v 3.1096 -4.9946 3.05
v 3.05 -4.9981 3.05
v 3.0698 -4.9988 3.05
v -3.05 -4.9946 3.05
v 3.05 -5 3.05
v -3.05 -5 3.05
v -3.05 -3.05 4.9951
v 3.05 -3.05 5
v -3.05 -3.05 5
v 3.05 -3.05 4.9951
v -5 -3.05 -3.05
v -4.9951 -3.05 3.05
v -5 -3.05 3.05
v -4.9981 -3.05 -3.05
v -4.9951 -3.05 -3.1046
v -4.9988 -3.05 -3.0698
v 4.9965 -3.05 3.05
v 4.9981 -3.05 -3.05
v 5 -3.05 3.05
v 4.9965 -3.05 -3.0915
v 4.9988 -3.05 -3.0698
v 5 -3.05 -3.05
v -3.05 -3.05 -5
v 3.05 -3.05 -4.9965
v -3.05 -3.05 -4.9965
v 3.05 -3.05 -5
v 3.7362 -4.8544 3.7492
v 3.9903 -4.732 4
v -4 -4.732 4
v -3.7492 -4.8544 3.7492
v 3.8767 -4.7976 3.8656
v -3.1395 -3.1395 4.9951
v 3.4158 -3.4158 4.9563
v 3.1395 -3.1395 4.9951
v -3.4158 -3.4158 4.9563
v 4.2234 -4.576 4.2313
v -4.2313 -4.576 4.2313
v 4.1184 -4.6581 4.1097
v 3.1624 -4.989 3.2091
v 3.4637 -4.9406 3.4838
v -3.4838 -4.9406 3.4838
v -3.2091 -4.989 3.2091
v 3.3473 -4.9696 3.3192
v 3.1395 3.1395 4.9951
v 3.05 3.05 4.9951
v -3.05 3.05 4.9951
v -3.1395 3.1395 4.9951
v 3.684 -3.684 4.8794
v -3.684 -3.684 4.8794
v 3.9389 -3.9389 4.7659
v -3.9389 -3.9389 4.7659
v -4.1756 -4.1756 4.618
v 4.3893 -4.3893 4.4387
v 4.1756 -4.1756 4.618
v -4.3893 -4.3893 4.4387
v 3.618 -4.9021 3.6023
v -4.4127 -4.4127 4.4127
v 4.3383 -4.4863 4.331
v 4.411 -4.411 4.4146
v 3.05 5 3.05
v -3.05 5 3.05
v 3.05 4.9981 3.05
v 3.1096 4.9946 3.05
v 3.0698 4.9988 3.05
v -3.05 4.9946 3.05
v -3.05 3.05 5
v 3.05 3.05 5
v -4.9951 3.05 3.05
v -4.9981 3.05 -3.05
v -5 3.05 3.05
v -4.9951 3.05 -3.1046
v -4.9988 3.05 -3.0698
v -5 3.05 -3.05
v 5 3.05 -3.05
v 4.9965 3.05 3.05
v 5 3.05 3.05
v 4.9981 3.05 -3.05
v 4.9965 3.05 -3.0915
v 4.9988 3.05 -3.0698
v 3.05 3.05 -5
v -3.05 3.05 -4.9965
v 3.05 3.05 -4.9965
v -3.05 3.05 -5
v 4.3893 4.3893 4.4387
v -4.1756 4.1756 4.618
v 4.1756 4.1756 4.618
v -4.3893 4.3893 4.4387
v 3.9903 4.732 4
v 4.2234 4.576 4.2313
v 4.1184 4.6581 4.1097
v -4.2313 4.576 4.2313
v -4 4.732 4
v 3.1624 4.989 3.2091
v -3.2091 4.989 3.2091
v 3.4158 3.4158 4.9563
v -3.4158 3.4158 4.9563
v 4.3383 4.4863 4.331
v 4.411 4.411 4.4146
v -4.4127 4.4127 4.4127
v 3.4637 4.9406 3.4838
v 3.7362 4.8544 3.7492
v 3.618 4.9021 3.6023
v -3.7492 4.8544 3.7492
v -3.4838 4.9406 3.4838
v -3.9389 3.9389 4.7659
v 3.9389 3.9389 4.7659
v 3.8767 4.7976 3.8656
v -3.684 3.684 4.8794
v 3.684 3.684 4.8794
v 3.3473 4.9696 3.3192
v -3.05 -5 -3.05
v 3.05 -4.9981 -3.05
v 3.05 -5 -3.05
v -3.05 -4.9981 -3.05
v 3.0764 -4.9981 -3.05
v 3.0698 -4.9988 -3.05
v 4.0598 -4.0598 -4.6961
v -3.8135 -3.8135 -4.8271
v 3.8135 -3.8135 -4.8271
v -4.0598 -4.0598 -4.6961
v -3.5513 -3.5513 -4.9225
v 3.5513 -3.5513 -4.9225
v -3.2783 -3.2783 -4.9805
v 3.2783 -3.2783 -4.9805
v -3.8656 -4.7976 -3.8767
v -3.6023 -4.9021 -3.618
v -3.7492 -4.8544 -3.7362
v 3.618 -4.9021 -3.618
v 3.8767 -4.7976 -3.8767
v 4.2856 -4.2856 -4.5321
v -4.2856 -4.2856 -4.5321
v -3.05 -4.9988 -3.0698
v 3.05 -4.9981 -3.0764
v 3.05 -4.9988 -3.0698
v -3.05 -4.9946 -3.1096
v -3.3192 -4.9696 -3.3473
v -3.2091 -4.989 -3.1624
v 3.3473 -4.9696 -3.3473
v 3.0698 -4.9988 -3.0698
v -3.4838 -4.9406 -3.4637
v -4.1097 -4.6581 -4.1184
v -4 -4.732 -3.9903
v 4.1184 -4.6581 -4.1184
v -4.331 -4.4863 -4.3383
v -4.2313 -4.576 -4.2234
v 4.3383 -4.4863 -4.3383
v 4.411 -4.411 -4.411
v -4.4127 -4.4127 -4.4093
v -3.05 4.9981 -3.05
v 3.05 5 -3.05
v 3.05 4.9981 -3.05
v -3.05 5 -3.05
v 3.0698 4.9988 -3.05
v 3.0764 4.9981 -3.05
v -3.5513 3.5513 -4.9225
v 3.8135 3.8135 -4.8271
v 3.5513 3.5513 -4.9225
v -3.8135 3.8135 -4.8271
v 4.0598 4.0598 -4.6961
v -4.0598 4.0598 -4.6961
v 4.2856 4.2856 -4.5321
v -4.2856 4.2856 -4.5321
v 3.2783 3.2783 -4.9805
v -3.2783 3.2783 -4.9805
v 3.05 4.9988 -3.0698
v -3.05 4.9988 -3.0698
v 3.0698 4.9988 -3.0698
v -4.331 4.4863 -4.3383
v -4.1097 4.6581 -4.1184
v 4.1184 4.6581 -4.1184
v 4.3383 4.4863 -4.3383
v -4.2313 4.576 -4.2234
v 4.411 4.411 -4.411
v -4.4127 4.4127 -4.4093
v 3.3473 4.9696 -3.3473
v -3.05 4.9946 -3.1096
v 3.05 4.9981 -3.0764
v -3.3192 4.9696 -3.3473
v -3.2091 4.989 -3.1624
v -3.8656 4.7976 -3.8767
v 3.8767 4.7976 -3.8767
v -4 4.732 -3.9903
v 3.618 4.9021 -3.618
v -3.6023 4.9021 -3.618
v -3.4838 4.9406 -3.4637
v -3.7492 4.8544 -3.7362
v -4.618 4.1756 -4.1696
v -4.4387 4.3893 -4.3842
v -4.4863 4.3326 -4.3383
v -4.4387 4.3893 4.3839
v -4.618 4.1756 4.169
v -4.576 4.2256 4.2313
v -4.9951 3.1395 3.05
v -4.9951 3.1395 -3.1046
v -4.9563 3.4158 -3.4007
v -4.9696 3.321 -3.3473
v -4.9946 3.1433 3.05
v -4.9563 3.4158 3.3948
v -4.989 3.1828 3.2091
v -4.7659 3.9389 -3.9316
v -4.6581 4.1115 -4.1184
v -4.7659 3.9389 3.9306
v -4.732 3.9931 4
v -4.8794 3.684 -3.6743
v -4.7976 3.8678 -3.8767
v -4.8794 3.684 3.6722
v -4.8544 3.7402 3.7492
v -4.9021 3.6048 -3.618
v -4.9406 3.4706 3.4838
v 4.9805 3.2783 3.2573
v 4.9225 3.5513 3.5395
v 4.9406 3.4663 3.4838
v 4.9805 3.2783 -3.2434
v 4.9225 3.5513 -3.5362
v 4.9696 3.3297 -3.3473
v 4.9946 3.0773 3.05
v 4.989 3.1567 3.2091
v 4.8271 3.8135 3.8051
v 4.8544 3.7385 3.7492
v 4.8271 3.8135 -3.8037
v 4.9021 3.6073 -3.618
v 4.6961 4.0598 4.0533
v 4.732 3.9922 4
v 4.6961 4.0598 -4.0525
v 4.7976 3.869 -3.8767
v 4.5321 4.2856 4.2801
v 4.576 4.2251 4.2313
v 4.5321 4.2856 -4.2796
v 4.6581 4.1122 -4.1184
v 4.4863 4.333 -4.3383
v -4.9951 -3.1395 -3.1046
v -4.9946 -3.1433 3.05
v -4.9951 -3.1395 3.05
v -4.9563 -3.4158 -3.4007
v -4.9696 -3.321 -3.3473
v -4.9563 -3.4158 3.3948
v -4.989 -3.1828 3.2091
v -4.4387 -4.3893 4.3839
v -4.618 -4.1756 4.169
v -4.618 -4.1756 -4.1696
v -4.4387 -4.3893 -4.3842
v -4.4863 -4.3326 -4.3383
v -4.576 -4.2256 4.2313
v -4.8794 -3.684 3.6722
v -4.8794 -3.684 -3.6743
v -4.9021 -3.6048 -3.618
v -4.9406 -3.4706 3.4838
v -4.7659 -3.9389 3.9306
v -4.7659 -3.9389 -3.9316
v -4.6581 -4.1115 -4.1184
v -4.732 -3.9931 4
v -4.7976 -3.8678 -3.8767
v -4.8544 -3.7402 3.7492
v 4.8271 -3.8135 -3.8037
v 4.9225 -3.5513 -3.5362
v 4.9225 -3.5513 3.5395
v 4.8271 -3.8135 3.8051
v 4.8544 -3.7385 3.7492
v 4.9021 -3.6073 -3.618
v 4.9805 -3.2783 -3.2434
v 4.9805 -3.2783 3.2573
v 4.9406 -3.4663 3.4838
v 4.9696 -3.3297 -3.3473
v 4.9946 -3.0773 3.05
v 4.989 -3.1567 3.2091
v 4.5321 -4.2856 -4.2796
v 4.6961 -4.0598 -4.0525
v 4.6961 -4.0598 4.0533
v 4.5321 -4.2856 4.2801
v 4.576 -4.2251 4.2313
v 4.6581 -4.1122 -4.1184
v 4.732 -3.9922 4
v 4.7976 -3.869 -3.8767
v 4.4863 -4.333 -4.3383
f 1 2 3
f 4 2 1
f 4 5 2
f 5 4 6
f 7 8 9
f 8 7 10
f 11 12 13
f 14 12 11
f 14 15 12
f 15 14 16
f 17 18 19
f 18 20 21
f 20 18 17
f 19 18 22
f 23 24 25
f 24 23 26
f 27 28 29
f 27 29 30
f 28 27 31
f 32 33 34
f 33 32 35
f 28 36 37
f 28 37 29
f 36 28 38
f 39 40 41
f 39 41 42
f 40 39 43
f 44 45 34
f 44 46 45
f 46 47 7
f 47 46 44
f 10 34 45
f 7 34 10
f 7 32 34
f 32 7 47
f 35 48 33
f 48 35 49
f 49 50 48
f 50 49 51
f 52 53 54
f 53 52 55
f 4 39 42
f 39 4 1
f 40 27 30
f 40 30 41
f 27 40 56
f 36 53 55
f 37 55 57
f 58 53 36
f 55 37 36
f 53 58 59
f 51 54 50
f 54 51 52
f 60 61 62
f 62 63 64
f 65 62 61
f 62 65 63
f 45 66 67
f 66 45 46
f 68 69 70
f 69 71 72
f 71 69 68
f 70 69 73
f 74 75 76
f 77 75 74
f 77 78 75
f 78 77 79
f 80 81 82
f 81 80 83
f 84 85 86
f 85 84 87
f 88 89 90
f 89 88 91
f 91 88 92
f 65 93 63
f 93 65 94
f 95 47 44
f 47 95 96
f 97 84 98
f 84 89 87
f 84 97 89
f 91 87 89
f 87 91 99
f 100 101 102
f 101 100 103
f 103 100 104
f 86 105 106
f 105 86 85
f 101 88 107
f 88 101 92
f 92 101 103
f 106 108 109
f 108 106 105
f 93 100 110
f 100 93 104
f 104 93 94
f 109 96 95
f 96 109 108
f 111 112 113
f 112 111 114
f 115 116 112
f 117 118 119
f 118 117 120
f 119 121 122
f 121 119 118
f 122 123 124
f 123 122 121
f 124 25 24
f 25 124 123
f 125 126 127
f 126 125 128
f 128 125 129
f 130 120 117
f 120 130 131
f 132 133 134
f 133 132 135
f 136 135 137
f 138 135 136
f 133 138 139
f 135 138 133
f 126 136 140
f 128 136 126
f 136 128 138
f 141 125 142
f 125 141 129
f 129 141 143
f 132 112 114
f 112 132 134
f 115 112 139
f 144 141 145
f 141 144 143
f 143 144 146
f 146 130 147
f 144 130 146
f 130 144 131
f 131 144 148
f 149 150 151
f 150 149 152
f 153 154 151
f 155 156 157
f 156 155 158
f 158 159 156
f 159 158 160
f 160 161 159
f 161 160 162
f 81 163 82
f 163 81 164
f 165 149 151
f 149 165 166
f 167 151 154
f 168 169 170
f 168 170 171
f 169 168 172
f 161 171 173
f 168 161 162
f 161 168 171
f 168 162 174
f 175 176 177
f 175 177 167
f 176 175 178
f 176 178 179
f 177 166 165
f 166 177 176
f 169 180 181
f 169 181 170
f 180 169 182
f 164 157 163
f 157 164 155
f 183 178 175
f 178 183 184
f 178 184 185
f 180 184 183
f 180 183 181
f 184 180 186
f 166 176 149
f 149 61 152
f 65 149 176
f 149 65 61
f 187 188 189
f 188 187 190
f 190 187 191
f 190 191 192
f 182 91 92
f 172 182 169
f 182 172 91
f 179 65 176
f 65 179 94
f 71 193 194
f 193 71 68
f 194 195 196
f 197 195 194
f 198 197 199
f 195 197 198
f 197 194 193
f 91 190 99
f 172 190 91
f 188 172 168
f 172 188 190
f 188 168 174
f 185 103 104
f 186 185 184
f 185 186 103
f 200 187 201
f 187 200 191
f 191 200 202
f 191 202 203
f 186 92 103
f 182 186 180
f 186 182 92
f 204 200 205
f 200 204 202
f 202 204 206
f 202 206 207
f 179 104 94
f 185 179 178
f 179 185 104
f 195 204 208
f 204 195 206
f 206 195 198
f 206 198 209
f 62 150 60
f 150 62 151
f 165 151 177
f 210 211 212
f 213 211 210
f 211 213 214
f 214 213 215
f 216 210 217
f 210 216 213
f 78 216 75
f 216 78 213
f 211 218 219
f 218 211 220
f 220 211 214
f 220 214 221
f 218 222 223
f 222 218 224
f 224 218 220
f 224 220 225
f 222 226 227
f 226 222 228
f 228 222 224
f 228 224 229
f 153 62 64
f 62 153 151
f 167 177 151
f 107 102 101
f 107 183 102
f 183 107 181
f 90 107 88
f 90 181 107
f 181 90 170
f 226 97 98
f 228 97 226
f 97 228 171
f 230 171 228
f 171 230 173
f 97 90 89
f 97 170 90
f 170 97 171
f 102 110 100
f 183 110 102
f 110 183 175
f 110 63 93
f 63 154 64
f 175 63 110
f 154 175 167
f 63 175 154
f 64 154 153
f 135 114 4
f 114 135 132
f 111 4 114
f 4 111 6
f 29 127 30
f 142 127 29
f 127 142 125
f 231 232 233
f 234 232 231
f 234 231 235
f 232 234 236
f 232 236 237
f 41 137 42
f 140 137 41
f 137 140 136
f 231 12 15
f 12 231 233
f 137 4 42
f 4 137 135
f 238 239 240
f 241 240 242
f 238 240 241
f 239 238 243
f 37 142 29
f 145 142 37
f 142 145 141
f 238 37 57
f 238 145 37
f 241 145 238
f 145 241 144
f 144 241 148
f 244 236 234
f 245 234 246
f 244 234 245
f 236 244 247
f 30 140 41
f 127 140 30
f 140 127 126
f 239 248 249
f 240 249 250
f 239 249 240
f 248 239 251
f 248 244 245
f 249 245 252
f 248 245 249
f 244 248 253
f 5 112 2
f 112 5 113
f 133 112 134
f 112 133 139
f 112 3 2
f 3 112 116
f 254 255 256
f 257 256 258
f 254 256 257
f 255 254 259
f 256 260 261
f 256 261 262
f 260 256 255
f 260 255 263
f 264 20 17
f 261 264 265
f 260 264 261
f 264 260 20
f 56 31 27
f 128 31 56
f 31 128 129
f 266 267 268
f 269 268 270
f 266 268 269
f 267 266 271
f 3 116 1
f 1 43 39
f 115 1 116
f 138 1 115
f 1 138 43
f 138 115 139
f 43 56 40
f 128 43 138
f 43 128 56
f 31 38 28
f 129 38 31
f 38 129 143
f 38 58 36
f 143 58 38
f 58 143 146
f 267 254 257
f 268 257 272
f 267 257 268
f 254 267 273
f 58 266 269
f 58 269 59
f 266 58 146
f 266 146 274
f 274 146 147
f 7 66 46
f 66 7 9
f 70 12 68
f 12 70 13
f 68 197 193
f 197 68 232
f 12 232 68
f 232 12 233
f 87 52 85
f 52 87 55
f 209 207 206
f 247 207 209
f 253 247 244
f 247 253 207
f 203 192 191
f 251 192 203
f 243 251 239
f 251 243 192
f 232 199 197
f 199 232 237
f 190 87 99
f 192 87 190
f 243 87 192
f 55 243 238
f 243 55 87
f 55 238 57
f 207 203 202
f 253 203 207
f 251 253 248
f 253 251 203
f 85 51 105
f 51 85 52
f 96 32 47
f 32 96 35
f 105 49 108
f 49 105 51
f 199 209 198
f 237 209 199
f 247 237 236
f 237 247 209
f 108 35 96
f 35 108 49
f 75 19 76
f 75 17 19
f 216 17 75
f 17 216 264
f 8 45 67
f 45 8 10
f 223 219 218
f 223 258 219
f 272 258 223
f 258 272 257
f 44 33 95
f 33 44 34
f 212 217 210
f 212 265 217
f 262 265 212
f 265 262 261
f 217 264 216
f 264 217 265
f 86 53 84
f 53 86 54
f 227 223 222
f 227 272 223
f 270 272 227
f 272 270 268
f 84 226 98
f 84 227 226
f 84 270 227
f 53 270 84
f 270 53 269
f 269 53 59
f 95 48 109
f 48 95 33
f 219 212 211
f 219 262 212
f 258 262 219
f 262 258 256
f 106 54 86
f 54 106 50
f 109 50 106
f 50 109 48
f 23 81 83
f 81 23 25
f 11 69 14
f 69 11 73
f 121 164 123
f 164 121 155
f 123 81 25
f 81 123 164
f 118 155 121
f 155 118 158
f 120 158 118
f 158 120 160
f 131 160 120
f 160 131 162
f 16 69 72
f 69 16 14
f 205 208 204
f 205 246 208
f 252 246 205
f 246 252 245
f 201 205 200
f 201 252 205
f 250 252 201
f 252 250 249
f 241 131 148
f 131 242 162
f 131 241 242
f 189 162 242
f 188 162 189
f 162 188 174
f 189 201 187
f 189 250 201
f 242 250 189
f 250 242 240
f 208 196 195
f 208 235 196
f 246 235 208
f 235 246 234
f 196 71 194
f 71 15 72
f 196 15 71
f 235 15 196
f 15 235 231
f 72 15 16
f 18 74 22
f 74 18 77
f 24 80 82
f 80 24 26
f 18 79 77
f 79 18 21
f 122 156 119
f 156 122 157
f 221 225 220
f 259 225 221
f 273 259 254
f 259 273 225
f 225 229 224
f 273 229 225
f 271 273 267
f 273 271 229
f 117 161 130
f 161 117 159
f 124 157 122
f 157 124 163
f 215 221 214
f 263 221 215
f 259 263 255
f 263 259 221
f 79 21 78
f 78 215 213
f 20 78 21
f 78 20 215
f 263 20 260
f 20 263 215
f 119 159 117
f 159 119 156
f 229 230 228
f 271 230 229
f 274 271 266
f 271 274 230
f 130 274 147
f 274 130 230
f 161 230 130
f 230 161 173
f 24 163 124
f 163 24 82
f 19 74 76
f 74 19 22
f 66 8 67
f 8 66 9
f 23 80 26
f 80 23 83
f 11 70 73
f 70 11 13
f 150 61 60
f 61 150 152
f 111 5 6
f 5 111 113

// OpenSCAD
pad = 0.1;	// Padding to maintain manifold
box_l = 10;	// Length
box_w = 10;	// Width
box_h = 10;	// Height
round_r = 2;	// Radius of round
smooth = 45;	// Number of facets of rounding cylinder

// Rounding all of the edges with cylinders
difference() {
	cube([box_l, box_w, box_h], center = true);

	translate([0, -box_w/2+round_r, box_h/2-round_r]) {
		difference() {
			translate([0,-round_r-pad,round_r+pad])
				cube([box_l+2*pad, round_r*2+pad, round_r*2+pad], center = true);
			rotate(a=[0,90,0])
				cylinder(box_l+4*pad,round_r,round_r,center=true,$fn=smooth);
		}
	}
	translate([0, box_w/2-round_r, box_h/2-round_r]) {
		difference() {
			translate([0,round_r+pad,round_r+pad])
				cube([box_l+2*pad, round_r*2+pad, round_r*2+pad], center = true);
			rotate(a=[0,90,0])
				cylinder(box_l+4*pad,round_r,round_r,center=true,$fn=smooth);
		}
	}
	translate([0, -box_w/2+round_r, -box_h/2+round_r]) {
		difference() {
			translate([0,-round_r-pad,-round_r-pad])
				cube([box_l+2*pad, round_r*2+pad, round_r*2+pad], center = true);
			rotate(a=[0,90,0])
				cylinder(box_l+4*pad,round_r,round_r,center=true,$fn=smooth);
		}
	}
	translate([0, box_w/2-round_r, -box_h/2+round_r]) {
		difference() {
			translate([0,round_r+pad,-round_r-pad])
				cube([box_l+2*pad, round_r*2+pad, round_r*2+pad], center = true);
			rotate(a=[0,90,0])
				cylinder(box_l+4*pad,round_r,round_r,center=true,$fn=smooth);
		}
	}

// ----

	translate([-box_l/2+round_r, box_w/2-round_r, 0]) {
		difference() {
			translate([-round_r-pad,round_r+pad,0])
				cube([round_r*2+pad, round_r*2+pad, box_h+2*pad], center = true);
			cylinder(box_h+4*pad,round_r,round_r,center=true,$fn=smooth);
		}
	}
	translate([box_l/2-round_r, box_w/2-round_r, 0]) {
		difference() {
			translate([round_r+pad,round_r+pad,0])
				cube([round_r*2+pad, round_r*2+pad, box_h+2*pad], center = true);
			cylinder(box_h+4*pad,round_r,round_r,center=true,$fn=smooth);
		}
	}

	translate([-box_l/2+round_r, -box_w/2+round_r, 0]) {
		difference() {
			translate([-round_r-pad,-round_r-pad,0])
				cube([round_r*2+pad, round_r*2+pad, box_h+2*pad], center = true);
			cylinder(box_h+4*pad,round_r,round_r,center=true,$fn=smooth);
		}
	}
	translate([box_l/2-round_r, -box_w/2+round_r, 0]) {
		difference() {
			translate([round_r+pad,-round_r-pad,0])
				cube([round_r*2+pad, round_r*2+pad, box_h+2*pad], center = true);
			cylinder(box_h+4*pad,round_r,round_r,center=true,$fn=smooth);
		}
	}

// ----

	translate([-box_l/2+round_r, 0, box_h/2-round_r]) {
		difference() {
			translate([-round_r-pad, 0, round_r+pad])
				cube([round_r*2+pad, box_w+2*pad, round_r*2+pad], center = true);
			rotate(a=[0,90,90])
				cylinder(box_w+4*pad,round_r,round_r,center=true,$fn=smooth);
		}
	}
	translate([box_l/2-round_r, 0, box_h/2-round_r]) {
		difference() {
			translate([round_r+pad, 0, round_r+pad])
				cube([round_r*2+pad, box_w+2*pad, round_r*2+pad], center = true);
			rotate(a=[0,90,90])
				cylinder(box_w+4*pad,round_r,round_r,center=true,$fn=smooth);
		}
	}
	translate([-box_l/2+round_r, 0, -box_h/2+round_r]) {
		difference() {
			translate([-round_r-pad, 0, -round_r-pad])
				cube([round_r*2+pad, box_w+2*pad, round_r*2+pad], center = true);
			rotate(a=[0,90,90])
				cylinder(box_w+4*pad,round_r,round_r,center=true,$fn=smooth);
		}
	}
	translate([box_l/2-round_r, 0, -box_h/2+round_r]) {
		difference() {
			translate([round_r+pad, 0, -round_r-pad])
				cube([round_r*2+pad, box_w+2*pad, round_r*2+pad], center = true);
			rotate(a=[0,90,90])
				cylinder(box_w+4*pad,round_r,round_r,center=true,$fn=smooth);
		}
	}
}
